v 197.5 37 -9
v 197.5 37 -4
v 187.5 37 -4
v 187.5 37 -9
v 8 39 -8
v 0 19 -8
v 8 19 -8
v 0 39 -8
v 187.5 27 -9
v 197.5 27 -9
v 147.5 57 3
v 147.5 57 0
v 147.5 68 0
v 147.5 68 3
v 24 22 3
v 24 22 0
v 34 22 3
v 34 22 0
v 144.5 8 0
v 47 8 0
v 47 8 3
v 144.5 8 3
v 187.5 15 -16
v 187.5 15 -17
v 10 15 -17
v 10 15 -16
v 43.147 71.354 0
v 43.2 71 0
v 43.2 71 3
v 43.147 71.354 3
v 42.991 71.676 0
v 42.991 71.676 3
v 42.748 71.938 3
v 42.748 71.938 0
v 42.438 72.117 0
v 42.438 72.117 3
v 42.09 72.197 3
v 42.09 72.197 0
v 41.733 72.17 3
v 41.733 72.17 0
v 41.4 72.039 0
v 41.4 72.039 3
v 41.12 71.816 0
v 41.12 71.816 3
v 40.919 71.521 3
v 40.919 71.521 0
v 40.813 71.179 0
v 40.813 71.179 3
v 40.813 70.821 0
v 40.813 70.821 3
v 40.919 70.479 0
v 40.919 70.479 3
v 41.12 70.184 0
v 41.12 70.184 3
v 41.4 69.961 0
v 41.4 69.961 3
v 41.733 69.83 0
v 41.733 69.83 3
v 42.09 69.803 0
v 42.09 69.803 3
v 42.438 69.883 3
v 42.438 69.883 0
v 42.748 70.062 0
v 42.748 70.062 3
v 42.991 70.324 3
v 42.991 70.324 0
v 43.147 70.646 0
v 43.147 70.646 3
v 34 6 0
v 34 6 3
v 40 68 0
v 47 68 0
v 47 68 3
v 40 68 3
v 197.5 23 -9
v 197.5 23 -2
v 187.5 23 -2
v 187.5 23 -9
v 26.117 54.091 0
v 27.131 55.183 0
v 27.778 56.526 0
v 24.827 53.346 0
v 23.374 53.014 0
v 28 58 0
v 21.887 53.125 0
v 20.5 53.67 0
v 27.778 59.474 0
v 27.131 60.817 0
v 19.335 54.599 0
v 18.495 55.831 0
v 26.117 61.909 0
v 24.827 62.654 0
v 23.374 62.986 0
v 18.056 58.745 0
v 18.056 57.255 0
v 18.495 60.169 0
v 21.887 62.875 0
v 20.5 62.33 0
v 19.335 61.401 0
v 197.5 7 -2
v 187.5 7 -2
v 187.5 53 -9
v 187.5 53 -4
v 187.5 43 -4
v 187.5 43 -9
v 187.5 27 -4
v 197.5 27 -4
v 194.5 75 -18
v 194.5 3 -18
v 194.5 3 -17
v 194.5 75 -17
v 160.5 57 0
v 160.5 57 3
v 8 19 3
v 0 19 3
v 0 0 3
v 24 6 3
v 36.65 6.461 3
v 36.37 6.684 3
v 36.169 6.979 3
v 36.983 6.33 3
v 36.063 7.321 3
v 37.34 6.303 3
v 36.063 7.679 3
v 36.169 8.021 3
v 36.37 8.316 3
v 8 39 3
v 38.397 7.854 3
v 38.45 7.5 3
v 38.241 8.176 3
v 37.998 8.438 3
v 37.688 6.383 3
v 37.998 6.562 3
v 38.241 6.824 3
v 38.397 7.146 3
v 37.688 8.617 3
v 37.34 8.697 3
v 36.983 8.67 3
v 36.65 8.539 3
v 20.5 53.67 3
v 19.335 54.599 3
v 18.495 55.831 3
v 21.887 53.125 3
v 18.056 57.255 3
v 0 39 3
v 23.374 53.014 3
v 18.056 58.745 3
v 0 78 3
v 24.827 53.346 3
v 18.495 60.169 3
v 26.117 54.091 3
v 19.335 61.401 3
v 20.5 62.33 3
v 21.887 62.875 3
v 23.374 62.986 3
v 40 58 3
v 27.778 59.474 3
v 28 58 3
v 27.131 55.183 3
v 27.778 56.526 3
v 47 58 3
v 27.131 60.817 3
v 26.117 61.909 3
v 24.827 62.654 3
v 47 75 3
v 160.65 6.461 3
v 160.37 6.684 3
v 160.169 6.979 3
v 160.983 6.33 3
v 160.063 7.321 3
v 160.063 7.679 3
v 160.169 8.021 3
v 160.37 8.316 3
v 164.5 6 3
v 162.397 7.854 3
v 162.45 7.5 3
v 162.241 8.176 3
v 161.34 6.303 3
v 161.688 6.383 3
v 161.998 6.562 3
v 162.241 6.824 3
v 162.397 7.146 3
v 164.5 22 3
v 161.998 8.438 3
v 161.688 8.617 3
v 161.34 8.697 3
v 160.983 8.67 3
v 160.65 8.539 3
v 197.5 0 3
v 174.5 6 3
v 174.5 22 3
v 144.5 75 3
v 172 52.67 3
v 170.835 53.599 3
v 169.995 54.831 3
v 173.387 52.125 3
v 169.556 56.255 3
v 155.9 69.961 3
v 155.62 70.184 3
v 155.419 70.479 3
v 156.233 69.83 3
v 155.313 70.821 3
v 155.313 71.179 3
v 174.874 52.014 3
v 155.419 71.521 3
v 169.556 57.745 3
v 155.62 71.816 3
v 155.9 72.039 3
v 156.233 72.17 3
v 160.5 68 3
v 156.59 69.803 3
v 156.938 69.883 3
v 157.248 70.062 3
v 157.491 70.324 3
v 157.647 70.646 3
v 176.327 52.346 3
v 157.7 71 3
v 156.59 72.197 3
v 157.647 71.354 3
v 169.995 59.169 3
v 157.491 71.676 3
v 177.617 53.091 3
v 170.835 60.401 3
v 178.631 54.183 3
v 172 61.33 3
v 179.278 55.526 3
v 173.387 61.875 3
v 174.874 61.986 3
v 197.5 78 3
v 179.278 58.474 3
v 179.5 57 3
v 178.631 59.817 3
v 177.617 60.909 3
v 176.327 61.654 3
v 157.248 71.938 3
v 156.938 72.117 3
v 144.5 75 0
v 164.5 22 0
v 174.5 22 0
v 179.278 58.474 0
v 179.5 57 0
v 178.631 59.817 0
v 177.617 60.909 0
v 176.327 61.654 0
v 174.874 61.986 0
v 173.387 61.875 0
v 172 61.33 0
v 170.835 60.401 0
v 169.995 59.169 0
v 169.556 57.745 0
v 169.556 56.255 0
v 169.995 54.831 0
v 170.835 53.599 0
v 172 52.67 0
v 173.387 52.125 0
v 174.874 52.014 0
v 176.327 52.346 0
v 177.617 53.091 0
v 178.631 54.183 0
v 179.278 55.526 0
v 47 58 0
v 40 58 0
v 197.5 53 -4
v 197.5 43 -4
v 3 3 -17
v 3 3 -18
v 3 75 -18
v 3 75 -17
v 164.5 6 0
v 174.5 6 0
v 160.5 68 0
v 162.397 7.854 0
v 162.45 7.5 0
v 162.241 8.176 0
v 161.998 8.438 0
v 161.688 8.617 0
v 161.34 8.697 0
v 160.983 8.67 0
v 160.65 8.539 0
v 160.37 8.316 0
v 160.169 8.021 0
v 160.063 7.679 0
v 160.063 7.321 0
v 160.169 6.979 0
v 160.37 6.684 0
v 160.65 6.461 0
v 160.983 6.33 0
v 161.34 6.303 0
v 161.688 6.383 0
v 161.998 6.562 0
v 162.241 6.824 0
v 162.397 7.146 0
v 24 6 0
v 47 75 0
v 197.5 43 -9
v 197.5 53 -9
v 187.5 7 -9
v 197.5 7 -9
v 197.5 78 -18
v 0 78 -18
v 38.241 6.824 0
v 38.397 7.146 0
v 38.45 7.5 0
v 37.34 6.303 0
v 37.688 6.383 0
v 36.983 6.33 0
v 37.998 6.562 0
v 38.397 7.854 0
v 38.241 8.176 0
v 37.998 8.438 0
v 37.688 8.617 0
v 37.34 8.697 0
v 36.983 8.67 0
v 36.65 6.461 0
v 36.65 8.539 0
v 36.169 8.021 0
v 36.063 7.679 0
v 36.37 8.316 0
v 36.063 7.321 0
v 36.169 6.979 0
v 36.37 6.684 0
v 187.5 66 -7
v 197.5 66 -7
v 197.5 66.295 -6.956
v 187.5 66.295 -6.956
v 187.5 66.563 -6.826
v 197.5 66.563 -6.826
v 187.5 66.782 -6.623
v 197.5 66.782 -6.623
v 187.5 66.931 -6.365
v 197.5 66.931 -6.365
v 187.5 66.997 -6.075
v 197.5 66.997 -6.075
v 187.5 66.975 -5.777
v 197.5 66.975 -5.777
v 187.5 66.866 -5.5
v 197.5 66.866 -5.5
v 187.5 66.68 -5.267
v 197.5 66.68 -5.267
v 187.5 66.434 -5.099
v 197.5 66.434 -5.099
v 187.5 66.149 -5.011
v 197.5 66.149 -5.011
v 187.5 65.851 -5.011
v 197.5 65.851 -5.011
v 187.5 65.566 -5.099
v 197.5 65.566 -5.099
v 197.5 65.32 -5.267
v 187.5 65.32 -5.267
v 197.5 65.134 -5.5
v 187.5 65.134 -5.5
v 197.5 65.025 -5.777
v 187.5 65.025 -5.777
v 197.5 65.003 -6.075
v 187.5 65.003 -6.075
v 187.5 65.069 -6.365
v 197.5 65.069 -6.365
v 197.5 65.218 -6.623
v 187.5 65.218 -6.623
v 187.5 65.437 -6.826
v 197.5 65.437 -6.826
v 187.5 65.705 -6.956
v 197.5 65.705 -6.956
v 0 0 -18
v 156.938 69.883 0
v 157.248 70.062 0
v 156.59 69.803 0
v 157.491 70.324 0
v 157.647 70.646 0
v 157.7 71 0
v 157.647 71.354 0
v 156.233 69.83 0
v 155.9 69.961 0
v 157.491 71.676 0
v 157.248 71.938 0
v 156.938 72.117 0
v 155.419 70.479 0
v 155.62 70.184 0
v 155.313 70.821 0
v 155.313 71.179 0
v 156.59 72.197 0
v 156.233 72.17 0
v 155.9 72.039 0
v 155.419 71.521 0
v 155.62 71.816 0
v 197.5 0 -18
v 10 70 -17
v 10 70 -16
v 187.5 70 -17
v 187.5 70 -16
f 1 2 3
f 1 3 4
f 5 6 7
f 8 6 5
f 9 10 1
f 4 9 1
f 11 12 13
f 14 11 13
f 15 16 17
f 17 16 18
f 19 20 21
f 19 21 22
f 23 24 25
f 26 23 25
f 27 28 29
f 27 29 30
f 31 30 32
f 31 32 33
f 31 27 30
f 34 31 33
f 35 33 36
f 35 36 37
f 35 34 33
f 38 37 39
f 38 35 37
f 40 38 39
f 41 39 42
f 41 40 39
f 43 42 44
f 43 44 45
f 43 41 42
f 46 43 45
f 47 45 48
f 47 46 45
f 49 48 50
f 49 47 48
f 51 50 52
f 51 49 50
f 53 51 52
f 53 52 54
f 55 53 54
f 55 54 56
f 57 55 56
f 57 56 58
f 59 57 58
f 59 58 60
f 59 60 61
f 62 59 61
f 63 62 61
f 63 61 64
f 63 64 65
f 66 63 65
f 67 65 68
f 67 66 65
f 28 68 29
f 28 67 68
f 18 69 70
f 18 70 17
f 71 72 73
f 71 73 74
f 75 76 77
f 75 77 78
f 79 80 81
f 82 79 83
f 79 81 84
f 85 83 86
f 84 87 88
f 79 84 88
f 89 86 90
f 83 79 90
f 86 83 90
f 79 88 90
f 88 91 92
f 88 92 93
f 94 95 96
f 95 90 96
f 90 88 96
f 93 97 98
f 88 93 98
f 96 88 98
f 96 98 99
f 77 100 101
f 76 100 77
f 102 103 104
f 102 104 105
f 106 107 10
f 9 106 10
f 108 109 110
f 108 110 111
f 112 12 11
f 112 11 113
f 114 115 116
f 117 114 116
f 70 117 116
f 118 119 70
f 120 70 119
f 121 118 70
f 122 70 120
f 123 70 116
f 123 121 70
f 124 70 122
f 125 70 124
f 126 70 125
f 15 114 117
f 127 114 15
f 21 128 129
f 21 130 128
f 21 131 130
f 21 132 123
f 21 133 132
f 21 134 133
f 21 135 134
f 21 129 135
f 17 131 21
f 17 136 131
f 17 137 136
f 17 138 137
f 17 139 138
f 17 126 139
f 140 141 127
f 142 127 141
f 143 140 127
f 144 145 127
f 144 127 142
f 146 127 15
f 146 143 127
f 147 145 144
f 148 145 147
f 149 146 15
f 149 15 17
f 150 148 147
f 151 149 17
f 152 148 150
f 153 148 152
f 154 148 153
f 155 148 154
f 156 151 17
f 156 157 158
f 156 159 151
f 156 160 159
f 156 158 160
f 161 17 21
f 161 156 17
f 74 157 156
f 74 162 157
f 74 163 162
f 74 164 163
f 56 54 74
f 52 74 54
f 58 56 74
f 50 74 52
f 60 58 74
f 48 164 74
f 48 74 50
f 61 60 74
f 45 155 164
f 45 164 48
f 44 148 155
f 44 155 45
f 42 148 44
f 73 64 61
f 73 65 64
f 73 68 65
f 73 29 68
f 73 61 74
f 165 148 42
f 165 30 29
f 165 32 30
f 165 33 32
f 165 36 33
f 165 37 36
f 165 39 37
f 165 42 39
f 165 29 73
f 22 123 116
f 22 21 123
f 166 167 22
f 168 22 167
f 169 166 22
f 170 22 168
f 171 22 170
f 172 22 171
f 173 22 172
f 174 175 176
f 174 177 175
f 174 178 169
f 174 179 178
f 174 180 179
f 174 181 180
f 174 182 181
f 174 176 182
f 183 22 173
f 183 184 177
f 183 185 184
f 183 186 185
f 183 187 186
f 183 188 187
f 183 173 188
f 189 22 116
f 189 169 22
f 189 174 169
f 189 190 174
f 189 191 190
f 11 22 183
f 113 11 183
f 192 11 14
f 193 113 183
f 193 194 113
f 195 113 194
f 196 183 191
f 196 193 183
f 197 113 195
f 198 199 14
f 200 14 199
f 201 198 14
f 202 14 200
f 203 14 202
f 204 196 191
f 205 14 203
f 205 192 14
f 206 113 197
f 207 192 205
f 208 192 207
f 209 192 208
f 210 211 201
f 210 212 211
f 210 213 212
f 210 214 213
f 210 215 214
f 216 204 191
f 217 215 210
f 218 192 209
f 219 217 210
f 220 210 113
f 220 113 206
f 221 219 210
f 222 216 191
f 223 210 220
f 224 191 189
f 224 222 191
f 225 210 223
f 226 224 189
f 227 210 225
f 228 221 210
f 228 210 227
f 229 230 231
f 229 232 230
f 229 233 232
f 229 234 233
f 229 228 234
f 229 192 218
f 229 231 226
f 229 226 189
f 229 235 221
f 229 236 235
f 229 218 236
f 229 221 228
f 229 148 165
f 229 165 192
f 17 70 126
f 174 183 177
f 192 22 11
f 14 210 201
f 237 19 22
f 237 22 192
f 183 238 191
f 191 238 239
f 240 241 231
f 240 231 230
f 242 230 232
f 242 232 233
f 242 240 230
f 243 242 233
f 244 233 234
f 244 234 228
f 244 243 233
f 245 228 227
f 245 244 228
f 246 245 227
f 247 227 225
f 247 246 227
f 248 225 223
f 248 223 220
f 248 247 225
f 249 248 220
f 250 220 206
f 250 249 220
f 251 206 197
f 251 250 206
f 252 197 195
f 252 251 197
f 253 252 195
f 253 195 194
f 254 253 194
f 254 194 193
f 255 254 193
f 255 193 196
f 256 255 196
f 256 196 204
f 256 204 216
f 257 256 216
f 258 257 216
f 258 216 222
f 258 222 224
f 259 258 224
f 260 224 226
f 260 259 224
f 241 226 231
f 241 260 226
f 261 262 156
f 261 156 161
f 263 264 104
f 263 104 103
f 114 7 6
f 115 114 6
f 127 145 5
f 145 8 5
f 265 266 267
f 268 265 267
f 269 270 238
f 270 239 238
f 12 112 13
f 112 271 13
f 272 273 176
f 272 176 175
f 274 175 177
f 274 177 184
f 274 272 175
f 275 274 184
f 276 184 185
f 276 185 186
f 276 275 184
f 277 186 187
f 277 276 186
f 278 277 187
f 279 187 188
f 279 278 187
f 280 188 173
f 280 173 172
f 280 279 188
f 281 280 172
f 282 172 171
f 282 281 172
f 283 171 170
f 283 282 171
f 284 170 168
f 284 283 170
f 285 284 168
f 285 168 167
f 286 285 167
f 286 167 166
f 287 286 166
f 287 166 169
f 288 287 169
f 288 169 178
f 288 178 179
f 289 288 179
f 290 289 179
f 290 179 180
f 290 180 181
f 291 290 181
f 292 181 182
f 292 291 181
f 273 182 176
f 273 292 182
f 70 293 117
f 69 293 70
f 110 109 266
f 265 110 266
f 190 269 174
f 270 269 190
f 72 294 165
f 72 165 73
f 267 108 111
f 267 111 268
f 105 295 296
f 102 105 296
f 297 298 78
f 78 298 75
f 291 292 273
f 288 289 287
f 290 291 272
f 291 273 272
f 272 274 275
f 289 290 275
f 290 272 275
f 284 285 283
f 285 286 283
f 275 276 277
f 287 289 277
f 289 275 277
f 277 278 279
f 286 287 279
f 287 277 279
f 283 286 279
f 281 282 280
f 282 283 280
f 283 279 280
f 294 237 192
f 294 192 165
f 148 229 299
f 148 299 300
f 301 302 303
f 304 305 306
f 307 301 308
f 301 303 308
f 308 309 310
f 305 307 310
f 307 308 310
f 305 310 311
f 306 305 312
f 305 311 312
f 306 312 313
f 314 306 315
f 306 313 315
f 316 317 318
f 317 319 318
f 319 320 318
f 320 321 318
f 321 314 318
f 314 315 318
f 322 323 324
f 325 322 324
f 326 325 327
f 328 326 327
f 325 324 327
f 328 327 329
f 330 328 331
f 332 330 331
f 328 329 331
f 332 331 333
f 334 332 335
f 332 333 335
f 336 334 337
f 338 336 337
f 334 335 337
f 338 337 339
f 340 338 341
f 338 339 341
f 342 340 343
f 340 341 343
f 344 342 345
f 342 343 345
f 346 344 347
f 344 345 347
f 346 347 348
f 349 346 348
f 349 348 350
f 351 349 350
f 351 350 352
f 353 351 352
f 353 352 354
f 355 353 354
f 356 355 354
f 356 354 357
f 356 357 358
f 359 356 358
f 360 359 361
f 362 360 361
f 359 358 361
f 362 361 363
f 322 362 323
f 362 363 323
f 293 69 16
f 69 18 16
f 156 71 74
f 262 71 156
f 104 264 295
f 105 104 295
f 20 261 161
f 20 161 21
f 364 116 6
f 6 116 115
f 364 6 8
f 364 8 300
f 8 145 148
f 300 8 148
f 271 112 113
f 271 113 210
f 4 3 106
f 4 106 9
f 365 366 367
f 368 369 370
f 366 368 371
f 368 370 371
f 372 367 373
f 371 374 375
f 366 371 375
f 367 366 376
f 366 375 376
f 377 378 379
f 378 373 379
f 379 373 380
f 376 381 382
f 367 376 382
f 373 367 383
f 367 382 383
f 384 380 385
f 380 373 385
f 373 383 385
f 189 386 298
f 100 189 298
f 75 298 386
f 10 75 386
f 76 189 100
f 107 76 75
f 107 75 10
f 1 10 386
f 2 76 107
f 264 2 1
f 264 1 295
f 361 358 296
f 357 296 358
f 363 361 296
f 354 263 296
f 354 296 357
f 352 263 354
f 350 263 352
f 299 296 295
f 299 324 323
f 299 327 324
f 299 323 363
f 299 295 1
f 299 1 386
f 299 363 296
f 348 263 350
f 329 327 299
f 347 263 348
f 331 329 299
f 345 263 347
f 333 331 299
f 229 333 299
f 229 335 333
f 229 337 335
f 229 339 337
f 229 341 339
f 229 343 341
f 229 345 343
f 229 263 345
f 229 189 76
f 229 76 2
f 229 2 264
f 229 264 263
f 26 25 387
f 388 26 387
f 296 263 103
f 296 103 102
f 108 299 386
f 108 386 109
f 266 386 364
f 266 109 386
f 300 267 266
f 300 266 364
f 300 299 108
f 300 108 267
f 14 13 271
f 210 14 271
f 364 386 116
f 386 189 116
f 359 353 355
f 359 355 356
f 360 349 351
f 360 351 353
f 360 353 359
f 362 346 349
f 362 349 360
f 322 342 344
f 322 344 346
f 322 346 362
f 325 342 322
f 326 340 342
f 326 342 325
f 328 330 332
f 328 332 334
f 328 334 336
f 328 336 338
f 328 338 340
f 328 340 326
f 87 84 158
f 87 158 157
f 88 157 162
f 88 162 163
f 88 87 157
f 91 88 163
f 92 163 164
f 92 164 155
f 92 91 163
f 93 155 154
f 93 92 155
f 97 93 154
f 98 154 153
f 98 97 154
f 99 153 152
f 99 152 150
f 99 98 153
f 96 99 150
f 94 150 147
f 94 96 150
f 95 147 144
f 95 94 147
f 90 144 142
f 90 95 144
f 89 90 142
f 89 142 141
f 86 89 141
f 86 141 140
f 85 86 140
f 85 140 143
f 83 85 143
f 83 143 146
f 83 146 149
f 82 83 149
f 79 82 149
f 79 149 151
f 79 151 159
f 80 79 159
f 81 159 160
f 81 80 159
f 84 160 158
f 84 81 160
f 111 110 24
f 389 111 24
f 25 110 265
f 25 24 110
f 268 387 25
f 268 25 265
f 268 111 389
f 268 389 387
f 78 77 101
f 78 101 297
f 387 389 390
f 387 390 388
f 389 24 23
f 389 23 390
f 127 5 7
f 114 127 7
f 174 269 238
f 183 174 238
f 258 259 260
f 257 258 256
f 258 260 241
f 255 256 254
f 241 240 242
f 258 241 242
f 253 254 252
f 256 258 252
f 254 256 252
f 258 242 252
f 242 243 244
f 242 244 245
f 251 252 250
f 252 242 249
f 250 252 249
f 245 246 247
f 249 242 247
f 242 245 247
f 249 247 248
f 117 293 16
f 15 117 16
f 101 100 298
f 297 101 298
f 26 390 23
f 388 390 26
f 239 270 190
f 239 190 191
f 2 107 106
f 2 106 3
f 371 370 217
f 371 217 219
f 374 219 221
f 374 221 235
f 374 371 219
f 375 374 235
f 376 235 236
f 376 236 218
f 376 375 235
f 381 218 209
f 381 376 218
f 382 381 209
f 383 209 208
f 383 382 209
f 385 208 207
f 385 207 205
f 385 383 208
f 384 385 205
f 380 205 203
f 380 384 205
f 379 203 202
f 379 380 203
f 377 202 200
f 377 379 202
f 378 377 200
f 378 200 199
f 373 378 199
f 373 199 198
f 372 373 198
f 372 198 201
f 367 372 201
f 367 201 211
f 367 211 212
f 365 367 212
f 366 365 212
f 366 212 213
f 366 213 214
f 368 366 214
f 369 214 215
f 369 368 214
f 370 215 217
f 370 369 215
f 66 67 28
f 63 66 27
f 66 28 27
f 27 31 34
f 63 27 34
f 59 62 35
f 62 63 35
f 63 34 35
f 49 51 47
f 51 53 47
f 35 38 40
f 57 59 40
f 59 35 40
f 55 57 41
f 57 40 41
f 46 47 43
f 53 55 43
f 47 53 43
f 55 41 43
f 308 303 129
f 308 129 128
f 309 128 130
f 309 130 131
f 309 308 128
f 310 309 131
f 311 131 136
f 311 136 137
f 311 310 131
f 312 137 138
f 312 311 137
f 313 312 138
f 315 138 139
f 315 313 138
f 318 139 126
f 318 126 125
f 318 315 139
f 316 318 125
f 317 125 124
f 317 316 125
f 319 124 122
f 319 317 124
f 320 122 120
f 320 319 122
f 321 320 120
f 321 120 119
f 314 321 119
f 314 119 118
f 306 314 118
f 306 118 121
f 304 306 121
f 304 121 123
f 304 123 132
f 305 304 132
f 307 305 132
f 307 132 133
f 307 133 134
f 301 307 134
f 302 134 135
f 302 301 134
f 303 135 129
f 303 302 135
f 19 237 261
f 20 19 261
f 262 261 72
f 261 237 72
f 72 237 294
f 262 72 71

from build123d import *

# Parameters (mm, degrees)
SKETCH1_R           = 1.2
SKETCH1_R_2         = 5
SKETCH1_W           = 13
SKETCH1_H           = 11
SKETCH1_W_2         = 10
SKETCH1_H_2         = 16
BOSS_EXTRUDE2_DEPTH = 3
SKETCH2_W           = 197.5
SKETCH2_H           = 78
BOSS_EXTRUDE3_DEPTH = 18
SKETCH3_W           = 191.5
SKETCH3_H           = 72
CUT_EXTRUDE1_DEPTH  = 1
SKETCH4_W           = 177.5
SKETCH4_H           = 55
CUT_EXTRUDE2_DEPTH  = 1
SKETCH5_W           = 11
SKETCH5_H           = 20
CUT_EXTRUDE3_DEPTH  = 8
SKETCH6_R           = 1
SKETCH6_W           = 7
SKETCH6_H           = 16
SKETCH6_W_2         = 5
SKETCH6_H_2         = 10
CUT_EXTRUDE4_DEPTH  = 10


with BuildPart() as part:
    # Sketch1 → Boss-Extrude2 (new body)
    with BuildSketch(Plane.XY):
        Polygon((0, 0), (197.5, 0), (197.5, 78), (0, 78), (0, 39), (8, 39), (8, 19), (0, 19), align=None)
        with Locations((37.25, 7.5)):
            Circle(SKETCH1_R, mode=Mode.SUBTRACT)
        with Locations((161.25, 7.5)):
            Circle(SKETCH1_R, mode=Mode.SUBTRACT)
        with Locations((156.5, 71)):
            Circle(SKETCH1_R, mode=Mode.SUBTRACT)
        with Locations((42, 71)):
            Circle(SKETCH1_R, mode=Mode.SUBTRACT)
        with Locations((23, 58)):
            Circle(SKETCH1_R_2, mode=Mode.SUBTRACT)
        with Locations((174.5, 57)):
            Circle(SKETCH1_R_2, mode=Mode.SUBTRACT)
        Polygon((47, 75), (47, 68), (40, 68), (40, 58), (47, 58), (47, 8), (144.5, 8), (144.5, 75), align=None, mode=Mode.SUBTRACT)
        with Locations((154, 62.5)):
            Rectangle(SKETCH1_W, SKETCH1_H, mode=Mode.SUBTRACT)
        with Locations((169.5, 14)):
            Rectangle(SKETCH1_W_2, SKETCH1_H_2, mode=Mode.SUBTRACT)
        with Locations((29, 14)):
            Rectangle(SKETCH1_W_2, SKETCH1_H_2, mode=Mode.SUBTRACT)
    extrude(amount=BOSS_EXTRUDE2_DEPTH)

    # Sketch2 → Boss-Extrude3 (add)
    with BuildSketch(Plane(origin=(0, 0, 0), x_dir=(-1, 0, 0), z_dir=(0, 0, -1))):
        with Locations((-98.75, 39)):
            Rectangle(SKETCH2_W, SKETCH2_H)
    extrude(amount=BOSS_EXTRUDE3_DEPTH)

    # Sketch3 → Cut-Extrude1 (cut)
    with BuildSketch(Plane(origin=(0, 0, -18), x_dir=(-1, 0, 0), z_dir=(0, 0, -1))):
        with Locations((-98.75, 39)):
            Rectangle(SKETCH3_W, SKETCH3_H)
    extrude(amount=-CUT_EXTRUDE1_DEPTH, mode=Mode.SUBTRACT)

    # Sketch4 → Cut-Extrude2 (cut)
    with BuildSketch(Plane(origin=(0, 0, -17), x_dir=(-1, 0, 0), z_dir=(0, 0, -1))):
        with Locations((-98.75, 42.5)):
            Rectangle(SKETCH4_W, SKETCH4_H)
    extrude(amount=-CUT_EXTRUDE2_DEPTH, mode=Mode.SUBTRACT)

    # Sketch5 → Cut-Extrude3 (cut)
    with BuildSketch(Plane.ZY):
        with Locations((-2.5, 29)):
            Rectangle(SKETCH5_W, SKETCH5_H)
    extrude(amount=-CUT_EXTRUDE3_DEPTH, mode=Mode.SUBTRACT)

    # Sketch6 → Cut-Extrude4 (cut)
    with BuildSketch(Plane(origin=(197.5, 0, 0), x_dir=(0, 0, -1), z_dir=(1, 0, 0))):
        with Locations((6, 66)):
            Circle(SKETCH6_R)
        with Locations((5.5, 15)):
            Rectangle(SKETCH6_W, SKETCH6_H)
        with Locations((6.5, 32)):
            Rectangle(SKETCH6_W_2, SKETCH6_H_2)
        with Locations((6.5, 48)):
            Rectangle(SKETCH6_W_2, SKETCH6_H_2)
    extrude(amount=-CUT_EXTRUDE4_DEPTH, mode=Mode.SUBTRACT)


solid = part.part
